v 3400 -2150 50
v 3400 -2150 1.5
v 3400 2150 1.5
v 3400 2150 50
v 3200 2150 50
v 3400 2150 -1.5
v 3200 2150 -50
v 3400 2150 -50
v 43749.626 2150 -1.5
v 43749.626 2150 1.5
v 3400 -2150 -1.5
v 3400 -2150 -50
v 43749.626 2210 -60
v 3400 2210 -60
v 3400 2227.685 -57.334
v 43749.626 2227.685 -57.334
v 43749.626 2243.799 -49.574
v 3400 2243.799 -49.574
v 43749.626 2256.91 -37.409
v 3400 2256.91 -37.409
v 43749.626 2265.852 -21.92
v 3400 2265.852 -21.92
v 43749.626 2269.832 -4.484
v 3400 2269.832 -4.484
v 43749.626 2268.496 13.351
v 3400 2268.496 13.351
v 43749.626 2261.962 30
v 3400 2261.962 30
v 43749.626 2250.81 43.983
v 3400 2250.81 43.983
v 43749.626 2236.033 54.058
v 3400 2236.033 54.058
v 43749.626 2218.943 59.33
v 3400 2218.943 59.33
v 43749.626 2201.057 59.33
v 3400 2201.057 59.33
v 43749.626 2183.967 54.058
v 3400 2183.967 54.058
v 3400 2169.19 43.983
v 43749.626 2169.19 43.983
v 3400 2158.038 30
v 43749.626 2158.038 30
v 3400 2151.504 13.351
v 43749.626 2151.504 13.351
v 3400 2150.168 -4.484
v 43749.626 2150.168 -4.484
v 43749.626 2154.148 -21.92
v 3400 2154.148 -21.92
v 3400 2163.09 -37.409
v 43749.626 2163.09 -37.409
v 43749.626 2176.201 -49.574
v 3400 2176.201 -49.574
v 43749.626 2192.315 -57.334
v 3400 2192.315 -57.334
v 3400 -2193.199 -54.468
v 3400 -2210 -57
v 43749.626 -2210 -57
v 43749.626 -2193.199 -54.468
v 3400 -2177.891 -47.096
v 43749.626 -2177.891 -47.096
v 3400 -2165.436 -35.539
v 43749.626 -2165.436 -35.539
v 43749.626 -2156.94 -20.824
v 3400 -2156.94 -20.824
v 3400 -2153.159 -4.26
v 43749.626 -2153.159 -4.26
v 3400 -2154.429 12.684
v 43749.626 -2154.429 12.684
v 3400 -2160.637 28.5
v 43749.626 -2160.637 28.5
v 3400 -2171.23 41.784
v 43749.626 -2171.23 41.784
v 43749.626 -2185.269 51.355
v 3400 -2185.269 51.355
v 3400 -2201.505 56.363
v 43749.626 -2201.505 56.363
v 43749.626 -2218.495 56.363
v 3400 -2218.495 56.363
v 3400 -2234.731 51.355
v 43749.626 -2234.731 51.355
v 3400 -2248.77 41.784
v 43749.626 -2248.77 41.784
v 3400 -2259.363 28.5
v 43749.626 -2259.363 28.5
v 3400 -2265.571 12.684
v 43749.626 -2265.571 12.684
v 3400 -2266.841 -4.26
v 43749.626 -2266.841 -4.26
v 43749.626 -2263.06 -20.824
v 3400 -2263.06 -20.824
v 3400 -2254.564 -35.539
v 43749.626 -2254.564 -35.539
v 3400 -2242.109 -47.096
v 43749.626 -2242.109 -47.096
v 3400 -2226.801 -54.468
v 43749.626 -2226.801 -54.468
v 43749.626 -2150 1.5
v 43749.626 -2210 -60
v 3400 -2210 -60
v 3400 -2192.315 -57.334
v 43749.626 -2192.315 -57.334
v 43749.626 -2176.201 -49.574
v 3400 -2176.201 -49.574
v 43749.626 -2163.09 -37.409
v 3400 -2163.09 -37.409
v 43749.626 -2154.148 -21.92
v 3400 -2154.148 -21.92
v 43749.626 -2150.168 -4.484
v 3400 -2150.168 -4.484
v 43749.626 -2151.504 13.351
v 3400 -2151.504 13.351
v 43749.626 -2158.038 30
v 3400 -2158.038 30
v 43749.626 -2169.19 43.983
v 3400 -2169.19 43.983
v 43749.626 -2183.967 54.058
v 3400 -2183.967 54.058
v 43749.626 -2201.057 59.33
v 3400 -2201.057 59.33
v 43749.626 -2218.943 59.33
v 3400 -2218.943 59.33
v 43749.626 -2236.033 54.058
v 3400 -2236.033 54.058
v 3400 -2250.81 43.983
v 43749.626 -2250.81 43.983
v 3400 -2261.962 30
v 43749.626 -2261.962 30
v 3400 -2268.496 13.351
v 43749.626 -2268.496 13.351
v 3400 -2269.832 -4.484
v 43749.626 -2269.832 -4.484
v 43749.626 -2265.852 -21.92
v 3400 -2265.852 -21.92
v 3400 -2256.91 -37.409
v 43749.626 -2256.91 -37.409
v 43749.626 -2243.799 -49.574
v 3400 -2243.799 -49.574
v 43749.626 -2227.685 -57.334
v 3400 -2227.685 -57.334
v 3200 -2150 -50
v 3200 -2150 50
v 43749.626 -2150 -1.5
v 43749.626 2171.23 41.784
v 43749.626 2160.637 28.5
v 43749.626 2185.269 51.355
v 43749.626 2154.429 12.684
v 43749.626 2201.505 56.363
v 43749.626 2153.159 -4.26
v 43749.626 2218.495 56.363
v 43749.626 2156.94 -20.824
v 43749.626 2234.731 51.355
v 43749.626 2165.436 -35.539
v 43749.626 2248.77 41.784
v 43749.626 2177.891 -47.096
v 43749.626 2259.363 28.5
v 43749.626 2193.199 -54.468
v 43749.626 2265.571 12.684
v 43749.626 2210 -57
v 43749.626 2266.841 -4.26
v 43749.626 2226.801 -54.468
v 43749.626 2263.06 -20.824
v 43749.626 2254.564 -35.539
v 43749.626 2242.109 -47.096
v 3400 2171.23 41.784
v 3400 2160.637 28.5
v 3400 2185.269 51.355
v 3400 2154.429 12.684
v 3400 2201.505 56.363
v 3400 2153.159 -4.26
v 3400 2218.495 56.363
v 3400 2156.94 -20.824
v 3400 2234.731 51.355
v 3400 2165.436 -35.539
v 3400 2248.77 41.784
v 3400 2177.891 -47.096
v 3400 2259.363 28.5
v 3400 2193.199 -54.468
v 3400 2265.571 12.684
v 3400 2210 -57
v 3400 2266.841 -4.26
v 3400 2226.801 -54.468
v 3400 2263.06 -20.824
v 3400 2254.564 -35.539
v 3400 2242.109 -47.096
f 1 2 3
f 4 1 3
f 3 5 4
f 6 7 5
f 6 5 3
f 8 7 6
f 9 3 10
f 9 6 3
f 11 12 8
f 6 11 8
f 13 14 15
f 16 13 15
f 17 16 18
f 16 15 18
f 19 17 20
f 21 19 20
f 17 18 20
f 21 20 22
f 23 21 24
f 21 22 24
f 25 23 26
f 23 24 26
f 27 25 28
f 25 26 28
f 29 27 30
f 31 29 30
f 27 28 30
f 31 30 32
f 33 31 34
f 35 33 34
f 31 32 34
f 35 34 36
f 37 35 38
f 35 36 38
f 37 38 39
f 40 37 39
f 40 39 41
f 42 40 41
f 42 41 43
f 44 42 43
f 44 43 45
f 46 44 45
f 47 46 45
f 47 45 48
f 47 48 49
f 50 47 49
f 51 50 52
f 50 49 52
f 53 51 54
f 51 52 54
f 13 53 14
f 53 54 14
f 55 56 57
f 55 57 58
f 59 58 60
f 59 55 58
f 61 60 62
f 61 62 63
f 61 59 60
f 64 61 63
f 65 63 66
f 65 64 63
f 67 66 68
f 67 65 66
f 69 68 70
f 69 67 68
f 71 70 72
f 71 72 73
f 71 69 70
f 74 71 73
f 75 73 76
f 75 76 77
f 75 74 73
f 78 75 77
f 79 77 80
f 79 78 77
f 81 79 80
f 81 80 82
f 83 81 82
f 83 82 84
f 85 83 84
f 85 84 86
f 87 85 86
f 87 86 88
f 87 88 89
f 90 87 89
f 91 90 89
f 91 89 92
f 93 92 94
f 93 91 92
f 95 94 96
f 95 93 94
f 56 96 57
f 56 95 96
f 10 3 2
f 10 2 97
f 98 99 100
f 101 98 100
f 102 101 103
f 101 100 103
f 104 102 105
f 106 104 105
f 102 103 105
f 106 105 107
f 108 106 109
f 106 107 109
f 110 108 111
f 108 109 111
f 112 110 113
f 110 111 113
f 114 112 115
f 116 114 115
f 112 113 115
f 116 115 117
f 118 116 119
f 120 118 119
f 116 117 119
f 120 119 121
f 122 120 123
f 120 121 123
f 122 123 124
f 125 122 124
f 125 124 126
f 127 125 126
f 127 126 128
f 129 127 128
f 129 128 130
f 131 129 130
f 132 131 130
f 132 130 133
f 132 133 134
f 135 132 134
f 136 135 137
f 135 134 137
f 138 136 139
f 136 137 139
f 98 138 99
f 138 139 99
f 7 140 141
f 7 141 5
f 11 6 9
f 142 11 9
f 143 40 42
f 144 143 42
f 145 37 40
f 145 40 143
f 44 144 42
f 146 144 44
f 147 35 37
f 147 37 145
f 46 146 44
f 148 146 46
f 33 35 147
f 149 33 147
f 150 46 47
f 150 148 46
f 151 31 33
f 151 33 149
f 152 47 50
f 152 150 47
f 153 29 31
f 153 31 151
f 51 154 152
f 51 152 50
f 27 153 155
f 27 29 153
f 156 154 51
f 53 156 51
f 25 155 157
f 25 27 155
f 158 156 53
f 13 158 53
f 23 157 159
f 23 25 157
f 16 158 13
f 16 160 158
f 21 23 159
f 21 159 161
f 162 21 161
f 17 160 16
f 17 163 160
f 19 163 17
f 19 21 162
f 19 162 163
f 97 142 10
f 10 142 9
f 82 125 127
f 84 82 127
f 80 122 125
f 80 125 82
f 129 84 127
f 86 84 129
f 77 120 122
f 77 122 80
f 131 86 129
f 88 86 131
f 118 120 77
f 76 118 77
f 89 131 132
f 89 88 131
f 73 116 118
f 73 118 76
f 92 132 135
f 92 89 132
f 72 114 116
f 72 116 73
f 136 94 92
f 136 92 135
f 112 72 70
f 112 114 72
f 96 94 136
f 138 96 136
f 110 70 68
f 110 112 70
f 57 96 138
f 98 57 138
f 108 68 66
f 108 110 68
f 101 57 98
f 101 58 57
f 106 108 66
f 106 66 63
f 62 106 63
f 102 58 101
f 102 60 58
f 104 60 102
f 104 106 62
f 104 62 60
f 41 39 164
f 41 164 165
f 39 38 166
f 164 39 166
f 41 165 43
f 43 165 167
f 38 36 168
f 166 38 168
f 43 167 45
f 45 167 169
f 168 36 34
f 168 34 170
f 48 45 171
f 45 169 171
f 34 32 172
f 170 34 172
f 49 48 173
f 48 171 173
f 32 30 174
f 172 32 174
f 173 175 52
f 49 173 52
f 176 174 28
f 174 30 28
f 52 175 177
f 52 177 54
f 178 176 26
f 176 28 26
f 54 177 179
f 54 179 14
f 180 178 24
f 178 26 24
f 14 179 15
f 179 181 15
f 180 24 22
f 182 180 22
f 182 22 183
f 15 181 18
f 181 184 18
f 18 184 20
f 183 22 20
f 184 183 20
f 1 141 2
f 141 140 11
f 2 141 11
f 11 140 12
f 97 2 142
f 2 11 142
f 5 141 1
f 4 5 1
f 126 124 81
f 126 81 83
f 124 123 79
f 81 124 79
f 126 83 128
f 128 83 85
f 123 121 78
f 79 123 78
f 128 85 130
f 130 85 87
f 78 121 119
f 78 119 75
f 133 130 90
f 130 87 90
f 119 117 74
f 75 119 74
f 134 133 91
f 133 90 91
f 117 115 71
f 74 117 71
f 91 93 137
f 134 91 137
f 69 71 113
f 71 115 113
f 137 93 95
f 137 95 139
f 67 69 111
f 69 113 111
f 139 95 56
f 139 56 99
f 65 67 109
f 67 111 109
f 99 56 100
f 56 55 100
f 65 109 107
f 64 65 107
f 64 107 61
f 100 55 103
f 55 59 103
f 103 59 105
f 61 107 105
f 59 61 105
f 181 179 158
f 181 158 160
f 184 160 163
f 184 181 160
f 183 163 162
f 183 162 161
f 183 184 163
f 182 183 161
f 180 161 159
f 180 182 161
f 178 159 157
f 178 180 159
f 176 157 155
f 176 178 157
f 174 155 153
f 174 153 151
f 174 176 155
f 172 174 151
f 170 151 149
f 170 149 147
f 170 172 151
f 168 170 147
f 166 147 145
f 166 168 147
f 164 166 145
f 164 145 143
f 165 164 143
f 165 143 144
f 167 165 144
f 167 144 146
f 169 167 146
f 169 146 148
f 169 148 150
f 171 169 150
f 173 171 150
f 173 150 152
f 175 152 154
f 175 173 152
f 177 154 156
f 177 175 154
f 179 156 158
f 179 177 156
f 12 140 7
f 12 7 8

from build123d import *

# Parameters (mm, degrees)
BOSS_EXTRUDE1_START = -50
SKETCH1_W           = 200
SKETCH1_H           = 4300
BOSS_EXTRUDE1_DEPTH = 100
BOSS_EXTRUDE2_START = -1.5
SKETCH2_W           = 40349.626189349
SKETCH2_H           = 4300
BOSS_EXTRUDE2_DEPTH = 3
BOSS_EXTRUDE3_START = 3400
SKETCH3_R           = 60
SKETCH3_R_2         = 57
BOSS_EXTRUDE3_DEPTH = 40349.626189349
BOSS_EXTRUDE4_START = 3400
SKETCH4_R           = 60
SKETCH4_R_2         = 57
BOSS_EXTRUDE4_DEPTH = 40349.626189349


with BuildPart() as part:
    # Sketch1 → Boss-Extrude1 (new body)
    with BuildSketch(Plane.XY.offset(BOSS_EXTRUDE1_START)):
        with Locations((3300, 0)):
            Rectangle(SKETCH1_W, SKETCH1_H)
    extrude(amount=BOSS_EXTRUDE1_DEPTH)

    # Sketch2 → Boss-Extrude2 (add)
    with BuildSketch(Plane.XY.offset(BOSS_EXTRUDE2_START)):
        with Locations((23574.813094675, 0)):
            Rectangle(SKETCH2_W, SKETCH2_H)
    extrude(amount=BOSS_EXTRUDE2_DEPTH)


with BuildPart() as body_2:
    # Sketch3 → Boss-Extrude3 (new body)
    with BuildSketch(Plane(origin=(0, 0, 0), x_dir=(0, 0, -1), z_dir=(1, 0, 0)).offset(BOSS_EXTRUDE3_START)):
        with Locations((0, -2210)):
            Circle(SKETCH3_R)
        with Locations((0, -2210)):
            Circle(SKETCH3_R_2, mode=Mode.SUBTRACT)
    extrude(amount=BOSS_EXTRUDE3_DEPTH)


with BuildPart() as body_3:
    # Sketch4 → Boss-Extrude4 (new body)
    with BuildSketch(Plane(origin=(0, 0, 0), x_dir=(0, 0, -1), z_dir=(1, 0, 0)).offset(BOSS_EXTRUDE4_START)):
        with Locations((0, 2210)):
            Circle(SKETCH4_R)
        with Locations((0, 2210)):
            Circle(SKETCH4_R_2, mode=Mode.SUBTRACT)
    extrude(amount=BOSS_EXTRUDE4_DEPTH)


solid = Compound([part.part, body_2.part, body_3.part])
